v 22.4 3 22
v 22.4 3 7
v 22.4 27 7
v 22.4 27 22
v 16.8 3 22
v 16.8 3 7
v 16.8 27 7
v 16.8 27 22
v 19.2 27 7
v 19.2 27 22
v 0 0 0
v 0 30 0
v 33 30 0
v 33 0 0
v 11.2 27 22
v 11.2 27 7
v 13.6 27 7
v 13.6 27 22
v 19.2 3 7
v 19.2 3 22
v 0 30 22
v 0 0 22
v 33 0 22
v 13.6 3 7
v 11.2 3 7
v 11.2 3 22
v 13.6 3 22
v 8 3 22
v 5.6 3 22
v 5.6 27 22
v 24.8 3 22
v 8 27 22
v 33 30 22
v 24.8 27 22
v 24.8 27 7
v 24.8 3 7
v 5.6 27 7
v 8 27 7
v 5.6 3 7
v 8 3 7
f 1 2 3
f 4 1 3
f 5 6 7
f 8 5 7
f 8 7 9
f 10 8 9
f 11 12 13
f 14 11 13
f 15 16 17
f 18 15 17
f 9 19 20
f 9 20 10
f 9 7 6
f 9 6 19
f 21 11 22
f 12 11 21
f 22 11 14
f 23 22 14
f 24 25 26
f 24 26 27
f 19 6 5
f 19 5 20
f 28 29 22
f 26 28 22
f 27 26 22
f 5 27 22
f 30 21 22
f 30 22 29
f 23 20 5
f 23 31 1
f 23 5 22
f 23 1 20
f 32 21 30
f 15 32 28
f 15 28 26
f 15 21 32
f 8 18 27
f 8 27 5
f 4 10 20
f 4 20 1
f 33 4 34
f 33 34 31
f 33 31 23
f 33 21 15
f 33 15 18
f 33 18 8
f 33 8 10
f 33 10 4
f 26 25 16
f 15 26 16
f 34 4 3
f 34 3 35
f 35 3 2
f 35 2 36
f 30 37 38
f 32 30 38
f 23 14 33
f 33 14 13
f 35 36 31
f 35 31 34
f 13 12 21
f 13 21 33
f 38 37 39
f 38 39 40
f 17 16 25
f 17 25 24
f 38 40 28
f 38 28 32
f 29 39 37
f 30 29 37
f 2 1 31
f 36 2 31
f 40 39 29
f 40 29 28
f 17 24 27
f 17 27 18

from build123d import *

# Parameters (mm, degrees)
BOX004_W     = 2.4
BOX004_H     = 24
BOX004_DEPTH = 15
BOX003_W     = 2.4
BOX003_H     = 24
BOX003_DEPTH = 15
BOX001_W     = 2.4
BOX001_H     = 24
BOX001_DEPTH = 15
BOX002_W     = 2.4
BOX002_H     = 24
BOX002_DEPTH = 15
BOX_W        = 33
BOX_H        = 30
BOX_DEPTH    = 22


with BuildPart() as ranura003:
    # Box004 → Box004 (new body)
    with BuildSketch(Plane(origin=(22.4, 3, 7), x_dir=(1, 0, 0), z_dir=(0, 0, 1))):
        with Locations((1.2, 12)):
            Rectangle(BOX004_W, BOX004_H)
    extrude(amount=BOX004_DEPTH)


with BuildPart() as fusion:
    # Box003 → Box003 (new body)
    with BuildSketch(Plane(origin=(16.8, 3, 7), x_dir=(1, 0, 0), z_dir=(0, 0, 1))):
        with Locations((1.2, 12)):
            Rectangle(BOX003_W, BOX003_H)
    extrude(amount=BOX003_DEPTH)

    # Fusion: union ranura003
    add(ranura003.part)


with BuildPart() as ranura:
    # Box001 → Box001 (new body)
    with BuildSketch(Plane(origin=(5.6, 3, 7), x_dir=(1, 0, 0), z_dir=(0, 0, 1))):
        with Locations((1.2, 12)):
            Rectangle(BOX001_W, BOX001_H)
    extrude(amount=BOX001_DEPTH)


with BuildPart() as fusion002:
    # Box002 → Box002 (new body)
    with BuildSketch(Plane(origin=(11.2, 3, 7), x_dir=(1, 0, 0), z_dir=(0, 0, 1))):
        with Locations((1.2, 12)):
            Rectangle(BOX002_W, BOX002_H)
    extrude(amount=BOX002_DEPTH)

    # Fusion001: union ranura
    add(ranura.part)

    # Fusion002: union Fusion
    add(fusion.part)


with BuildPart() as cut:
    # Box → Box (new body)
    with BuildSketch(Plane.XY):
        with Locations((16.5, 15)):
            Rectangle(BOX_W, BOX_H)
    extrude(amount=BOX_DEPTH)

    # Cut: cut Fusion002
    add(fusion002.part, mode=Mode.SUBTRACT)


solid = cut.part
